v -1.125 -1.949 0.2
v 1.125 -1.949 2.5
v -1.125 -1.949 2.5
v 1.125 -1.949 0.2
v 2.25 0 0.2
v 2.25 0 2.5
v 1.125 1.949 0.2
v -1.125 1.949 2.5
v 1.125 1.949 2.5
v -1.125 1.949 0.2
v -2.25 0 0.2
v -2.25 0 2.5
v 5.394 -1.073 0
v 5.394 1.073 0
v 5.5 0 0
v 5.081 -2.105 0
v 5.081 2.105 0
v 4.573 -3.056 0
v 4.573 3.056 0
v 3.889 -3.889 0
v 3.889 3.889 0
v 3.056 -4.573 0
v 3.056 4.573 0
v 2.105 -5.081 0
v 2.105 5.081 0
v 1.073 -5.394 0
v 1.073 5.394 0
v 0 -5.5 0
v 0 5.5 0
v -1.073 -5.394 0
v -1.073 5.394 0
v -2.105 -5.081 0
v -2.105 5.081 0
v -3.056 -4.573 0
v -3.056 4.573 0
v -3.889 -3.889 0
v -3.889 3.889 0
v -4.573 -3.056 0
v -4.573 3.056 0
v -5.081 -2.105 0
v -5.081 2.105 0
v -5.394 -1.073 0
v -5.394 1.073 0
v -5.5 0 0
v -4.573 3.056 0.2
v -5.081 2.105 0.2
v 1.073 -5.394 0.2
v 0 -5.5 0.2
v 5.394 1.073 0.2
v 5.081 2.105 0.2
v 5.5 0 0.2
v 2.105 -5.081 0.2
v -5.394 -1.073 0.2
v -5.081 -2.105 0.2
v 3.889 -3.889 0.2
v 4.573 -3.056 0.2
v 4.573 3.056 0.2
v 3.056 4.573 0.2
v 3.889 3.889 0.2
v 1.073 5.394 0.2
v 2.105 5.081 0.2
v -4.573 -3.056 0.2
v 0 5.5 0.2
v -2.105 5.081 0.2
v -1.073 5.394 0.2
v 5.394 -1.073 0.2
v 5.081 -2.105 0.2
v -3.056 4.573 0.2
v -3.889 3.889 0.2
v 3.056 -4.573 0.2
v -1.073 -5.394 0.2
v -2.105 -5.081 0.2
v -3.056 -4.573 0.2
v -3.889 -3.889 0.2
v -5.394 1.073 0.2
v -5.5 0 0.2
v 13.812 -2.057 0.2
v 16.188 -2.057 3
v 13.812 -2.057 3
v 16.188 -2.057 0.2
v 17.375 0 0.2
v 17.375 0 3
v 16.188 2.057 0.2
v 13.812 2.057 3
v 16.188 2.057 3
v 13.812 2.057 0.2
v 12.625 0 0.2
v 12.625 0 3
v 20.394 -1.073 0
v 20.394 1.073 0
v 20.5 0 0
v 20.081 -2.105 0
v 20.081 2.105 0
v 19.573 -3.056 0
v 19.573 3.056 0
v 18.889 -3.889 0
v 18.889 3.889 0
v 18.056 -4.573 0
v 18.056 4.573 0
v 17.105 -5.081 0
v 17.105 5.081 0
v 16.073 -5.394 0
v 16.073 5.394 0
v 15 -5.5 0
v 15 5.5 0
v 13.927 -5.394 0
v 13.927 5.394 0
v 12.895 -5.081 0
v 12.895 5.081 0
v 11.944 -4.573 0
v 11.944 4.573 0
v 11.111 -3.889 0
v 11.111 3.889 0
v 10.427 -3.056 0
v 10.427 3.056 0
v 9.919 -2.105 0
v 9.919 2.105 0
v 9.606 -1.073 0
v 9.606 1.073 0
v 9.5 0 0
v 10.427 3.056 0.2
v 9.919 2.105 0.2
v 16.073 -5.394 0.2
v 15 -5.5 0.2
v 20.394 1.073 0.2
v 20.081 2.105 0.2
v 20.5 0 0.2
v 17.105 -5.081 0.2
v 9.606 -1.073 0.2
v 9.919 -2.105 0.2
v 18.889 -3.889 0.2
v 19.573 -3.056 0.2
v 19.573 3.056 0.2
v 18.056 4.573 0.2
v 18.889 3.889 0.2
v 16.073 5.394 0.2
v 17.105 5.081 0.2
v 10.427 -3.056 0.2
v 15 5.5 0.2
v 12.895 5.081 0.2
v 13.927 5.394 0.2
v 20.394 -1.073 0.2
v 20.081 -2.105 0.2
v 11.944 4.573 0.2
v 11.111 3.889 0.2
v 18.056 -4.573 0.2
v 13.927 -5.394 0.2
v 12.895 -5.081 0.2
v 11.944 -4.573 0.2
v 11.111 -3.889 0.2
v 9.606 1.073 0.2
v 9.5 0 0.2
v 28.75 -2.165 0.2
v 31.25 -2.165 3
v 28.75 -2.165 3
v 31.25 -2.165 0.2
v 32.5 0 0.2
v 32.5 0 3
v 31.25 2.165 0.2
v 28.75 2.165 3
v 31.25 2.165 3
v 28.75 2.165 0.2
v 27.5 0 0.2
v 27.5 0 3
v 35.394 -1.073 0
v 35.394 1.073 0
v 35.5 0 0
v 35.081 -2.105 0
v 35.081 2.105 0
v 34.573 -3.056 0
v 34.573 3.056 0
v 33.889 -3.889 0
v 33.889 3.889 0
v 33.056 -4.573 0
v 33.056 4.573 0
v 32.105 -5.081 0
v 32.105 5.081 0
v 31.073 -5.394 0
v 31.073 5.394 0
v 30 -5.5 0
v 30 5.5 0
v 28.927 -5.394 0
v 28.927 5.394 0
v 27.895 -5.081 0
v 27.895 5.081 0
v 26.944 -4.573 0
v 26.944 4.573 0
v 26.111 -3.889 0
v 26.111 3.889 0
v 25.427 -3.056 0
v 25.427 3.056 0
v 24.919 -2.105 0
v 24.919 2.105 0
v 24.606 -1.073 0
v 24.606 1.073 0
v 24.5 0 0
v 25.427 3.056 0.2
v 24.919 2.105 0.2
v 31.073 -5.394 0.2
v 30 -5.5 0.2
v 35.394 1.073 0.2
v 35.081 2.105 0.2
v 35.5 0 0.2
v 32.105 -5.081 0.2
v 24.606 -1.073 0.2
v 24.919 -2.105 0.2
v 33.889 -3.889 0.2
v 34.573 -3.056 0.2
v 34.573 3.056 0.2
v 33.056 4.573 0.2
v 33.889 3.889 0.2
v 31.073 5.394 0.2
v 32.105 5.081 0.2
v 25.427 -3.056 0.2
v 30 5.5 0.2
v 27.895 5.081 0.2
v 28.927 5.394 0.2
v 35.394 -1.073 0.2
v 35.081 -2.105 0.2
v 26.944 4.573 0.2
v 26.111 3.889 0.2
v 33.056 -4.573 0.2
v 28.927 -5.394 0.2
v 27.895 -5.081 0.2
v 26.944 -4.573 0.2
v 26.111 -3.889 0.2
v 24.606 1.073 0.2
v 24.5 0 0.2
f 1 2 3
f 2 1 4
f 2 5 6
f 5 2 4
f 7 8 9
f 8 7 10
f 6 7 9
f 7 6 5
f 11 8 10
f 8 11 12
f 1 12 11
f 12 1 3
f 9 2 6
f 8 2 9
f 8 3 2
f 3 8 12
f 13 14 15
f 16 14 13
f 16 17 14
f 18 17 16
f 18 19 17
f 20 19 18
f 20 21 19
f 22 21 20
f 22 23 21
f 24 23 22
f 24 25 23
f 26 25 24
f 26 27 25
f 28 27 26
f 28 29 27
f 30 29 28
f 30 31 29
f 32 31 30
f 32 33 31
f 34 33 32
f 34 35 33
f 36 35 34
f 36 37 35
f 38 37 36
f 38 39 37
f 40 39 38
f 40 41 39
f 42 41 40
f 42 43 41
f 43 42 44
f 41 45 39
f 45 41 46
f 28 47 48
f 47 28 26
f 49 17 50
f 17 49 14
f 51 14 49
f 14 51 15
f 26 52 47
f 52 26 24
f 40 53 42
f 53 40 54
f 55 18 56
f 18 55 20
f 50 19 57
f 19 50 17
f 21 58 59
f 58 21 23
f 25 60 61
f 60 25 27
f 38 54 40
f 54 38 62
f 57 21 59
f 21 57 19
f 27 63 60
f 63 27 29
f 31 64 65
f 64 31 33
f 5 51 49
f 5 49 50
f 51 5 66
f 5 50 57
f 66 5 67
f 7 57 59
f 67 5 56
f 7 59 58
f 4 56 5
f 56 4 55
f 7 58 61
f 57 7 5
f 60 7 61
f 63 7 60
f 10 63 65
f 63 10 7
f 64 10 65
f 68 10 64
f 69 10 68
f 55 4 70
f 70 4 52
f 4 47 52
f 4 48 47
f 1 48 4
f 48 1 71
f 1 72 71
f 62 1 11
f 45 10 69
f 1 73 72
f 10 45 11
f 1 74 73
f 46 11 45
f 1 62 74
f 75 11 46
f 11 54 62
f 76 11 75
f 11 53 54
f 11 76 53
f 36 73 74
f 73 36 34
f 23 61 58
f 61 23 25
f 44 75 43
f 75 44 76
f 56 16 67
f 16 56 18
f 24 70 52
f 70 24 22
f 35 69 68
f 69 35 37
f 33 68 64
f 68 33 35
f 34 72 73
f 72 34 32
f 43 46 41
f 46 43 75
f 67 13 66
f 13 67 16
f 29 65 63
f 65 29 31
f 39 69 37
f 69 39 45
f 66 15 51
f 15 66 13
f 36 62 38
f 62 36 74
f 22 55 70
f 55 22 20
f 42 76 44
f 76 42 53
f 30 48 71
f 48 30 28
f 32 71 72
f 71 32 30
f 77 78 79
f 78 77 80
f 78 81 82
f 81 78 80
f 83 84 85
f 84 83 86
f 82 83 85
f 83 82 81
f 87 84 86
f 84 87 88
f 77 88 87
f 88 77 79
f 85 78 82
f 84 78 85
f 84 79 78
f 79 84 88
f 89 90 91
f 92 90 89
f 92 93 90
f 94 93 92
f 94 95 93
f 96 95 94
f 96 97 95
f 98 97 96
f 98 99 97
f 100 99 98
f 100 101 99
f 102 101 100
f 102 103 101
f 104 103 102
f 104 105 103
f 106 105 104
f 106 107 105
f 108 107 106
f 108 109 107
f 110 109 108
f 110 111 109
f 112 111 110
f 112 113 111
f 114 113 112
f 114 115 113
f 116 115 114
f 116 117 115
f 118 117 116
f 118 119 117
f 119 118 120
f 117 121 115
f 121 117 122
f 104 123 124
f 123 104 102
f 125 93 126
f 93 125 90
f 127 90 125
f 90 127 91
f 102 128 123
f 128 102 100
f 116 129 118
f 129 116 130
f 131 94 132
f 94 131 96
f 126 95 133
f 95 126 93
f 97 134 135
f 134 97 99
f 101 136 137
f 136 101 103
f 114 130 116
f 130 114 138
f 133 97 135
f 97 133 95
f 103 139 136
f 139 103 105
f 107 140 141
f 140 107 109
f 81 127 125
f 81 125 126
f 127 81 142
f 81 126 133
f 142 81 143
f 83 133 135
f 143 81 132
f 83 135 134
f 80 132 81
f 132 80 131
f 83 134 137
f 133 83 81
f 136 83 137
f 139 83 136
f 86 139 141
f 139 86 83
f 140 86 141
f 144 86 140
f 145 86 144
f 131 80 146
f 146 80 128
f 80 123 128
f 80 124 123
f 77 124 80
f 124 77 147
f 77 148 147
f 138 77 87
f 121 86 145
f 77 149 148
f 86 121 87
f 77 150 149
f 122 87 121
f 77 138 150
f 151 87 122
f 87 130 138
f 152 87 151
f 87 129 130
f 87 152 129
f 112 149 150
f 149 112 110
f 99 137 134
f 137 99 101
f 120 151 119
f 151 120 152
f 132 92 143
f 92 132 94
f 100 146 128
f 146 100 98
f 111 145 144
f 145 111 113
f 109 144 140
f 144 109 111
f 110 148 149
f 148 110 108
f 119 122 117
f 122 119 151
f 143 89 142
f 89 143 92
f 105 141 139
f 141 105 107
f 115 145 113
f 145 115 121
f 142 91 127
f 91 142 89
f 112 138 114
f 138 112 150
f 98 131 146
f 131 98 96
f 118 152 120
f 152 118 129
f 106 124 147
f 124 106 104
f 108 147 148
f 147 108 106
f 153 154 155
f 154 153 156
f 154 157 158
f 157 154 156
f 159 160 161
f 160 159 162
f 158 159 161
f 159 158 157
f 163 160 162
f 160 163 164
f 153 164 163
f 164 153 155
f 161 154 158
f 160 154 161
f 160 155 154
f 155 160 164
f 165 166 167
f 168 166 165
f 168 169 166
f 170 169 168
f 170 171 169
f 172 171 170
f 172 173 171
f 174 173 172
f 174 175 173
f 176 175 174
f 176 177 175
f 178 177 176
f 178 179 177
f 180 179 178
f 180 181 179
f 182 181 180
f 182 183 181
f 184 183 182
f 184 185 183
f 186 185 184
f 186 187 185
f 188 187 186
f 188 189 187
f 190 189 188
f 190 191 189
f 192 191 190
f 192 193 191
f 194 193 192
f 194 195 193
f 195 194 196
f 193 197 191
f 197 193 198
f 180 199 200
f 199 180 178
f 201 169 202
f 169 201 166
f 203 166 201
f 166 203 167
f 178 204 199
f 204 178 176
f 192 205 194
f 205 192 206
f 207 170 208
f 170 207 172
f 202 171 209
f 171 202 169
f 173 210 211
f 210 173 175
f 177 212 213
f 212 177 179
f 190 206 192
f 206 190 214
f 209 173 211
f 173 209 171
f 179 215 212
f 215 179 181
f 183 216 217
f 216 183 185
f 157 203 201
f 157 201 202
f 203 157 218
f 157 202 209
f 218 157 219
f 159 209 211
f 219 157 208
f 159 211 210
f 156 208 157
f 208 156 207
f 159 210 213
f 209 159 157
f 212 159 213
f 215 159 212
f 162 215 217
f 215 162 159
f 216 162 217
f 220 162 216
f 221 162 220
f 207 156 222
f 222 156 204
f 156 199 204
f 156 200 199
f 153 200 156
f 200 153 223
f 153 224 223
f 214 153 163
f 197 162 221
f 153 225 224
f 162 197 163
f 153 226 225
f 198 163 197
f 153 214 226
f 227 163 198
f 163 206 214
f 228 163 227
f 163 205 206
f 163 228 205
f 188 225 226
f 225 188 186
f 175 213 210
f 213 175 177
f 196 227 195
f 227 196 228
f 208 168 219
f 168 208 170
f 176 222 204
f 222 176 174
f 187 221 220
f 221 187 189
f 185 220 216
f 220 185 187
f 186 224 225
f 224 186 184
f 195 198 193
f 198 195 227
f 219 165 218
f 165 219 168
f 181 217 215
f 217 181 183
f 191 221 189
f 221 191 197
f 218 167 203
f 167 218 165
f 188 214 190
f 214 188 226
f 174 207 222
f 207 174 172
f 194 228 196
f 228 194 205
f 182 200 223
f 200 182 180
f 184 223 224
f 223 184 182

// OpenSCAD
$fn=32;

module krytka(priemer = 11, velkost_pin = 4.5, vyska = 2.5) {
    cylinder(h = vyska, d = velkost_pin, $fn = 6);
    cylinder(h = 0.2, d = priemer);
}

translate([0,0,0]) krytka(priemer = 11, velkost_pin = 4.5, vyska = 2.5);
translate([15,0,0]) krytka(priemer = 11, velkost_pin = 4.75, vyska = 3);
translate([30,0,0]) krytka(priemer = 11, velkost_pin = 5, vyska = 3);
